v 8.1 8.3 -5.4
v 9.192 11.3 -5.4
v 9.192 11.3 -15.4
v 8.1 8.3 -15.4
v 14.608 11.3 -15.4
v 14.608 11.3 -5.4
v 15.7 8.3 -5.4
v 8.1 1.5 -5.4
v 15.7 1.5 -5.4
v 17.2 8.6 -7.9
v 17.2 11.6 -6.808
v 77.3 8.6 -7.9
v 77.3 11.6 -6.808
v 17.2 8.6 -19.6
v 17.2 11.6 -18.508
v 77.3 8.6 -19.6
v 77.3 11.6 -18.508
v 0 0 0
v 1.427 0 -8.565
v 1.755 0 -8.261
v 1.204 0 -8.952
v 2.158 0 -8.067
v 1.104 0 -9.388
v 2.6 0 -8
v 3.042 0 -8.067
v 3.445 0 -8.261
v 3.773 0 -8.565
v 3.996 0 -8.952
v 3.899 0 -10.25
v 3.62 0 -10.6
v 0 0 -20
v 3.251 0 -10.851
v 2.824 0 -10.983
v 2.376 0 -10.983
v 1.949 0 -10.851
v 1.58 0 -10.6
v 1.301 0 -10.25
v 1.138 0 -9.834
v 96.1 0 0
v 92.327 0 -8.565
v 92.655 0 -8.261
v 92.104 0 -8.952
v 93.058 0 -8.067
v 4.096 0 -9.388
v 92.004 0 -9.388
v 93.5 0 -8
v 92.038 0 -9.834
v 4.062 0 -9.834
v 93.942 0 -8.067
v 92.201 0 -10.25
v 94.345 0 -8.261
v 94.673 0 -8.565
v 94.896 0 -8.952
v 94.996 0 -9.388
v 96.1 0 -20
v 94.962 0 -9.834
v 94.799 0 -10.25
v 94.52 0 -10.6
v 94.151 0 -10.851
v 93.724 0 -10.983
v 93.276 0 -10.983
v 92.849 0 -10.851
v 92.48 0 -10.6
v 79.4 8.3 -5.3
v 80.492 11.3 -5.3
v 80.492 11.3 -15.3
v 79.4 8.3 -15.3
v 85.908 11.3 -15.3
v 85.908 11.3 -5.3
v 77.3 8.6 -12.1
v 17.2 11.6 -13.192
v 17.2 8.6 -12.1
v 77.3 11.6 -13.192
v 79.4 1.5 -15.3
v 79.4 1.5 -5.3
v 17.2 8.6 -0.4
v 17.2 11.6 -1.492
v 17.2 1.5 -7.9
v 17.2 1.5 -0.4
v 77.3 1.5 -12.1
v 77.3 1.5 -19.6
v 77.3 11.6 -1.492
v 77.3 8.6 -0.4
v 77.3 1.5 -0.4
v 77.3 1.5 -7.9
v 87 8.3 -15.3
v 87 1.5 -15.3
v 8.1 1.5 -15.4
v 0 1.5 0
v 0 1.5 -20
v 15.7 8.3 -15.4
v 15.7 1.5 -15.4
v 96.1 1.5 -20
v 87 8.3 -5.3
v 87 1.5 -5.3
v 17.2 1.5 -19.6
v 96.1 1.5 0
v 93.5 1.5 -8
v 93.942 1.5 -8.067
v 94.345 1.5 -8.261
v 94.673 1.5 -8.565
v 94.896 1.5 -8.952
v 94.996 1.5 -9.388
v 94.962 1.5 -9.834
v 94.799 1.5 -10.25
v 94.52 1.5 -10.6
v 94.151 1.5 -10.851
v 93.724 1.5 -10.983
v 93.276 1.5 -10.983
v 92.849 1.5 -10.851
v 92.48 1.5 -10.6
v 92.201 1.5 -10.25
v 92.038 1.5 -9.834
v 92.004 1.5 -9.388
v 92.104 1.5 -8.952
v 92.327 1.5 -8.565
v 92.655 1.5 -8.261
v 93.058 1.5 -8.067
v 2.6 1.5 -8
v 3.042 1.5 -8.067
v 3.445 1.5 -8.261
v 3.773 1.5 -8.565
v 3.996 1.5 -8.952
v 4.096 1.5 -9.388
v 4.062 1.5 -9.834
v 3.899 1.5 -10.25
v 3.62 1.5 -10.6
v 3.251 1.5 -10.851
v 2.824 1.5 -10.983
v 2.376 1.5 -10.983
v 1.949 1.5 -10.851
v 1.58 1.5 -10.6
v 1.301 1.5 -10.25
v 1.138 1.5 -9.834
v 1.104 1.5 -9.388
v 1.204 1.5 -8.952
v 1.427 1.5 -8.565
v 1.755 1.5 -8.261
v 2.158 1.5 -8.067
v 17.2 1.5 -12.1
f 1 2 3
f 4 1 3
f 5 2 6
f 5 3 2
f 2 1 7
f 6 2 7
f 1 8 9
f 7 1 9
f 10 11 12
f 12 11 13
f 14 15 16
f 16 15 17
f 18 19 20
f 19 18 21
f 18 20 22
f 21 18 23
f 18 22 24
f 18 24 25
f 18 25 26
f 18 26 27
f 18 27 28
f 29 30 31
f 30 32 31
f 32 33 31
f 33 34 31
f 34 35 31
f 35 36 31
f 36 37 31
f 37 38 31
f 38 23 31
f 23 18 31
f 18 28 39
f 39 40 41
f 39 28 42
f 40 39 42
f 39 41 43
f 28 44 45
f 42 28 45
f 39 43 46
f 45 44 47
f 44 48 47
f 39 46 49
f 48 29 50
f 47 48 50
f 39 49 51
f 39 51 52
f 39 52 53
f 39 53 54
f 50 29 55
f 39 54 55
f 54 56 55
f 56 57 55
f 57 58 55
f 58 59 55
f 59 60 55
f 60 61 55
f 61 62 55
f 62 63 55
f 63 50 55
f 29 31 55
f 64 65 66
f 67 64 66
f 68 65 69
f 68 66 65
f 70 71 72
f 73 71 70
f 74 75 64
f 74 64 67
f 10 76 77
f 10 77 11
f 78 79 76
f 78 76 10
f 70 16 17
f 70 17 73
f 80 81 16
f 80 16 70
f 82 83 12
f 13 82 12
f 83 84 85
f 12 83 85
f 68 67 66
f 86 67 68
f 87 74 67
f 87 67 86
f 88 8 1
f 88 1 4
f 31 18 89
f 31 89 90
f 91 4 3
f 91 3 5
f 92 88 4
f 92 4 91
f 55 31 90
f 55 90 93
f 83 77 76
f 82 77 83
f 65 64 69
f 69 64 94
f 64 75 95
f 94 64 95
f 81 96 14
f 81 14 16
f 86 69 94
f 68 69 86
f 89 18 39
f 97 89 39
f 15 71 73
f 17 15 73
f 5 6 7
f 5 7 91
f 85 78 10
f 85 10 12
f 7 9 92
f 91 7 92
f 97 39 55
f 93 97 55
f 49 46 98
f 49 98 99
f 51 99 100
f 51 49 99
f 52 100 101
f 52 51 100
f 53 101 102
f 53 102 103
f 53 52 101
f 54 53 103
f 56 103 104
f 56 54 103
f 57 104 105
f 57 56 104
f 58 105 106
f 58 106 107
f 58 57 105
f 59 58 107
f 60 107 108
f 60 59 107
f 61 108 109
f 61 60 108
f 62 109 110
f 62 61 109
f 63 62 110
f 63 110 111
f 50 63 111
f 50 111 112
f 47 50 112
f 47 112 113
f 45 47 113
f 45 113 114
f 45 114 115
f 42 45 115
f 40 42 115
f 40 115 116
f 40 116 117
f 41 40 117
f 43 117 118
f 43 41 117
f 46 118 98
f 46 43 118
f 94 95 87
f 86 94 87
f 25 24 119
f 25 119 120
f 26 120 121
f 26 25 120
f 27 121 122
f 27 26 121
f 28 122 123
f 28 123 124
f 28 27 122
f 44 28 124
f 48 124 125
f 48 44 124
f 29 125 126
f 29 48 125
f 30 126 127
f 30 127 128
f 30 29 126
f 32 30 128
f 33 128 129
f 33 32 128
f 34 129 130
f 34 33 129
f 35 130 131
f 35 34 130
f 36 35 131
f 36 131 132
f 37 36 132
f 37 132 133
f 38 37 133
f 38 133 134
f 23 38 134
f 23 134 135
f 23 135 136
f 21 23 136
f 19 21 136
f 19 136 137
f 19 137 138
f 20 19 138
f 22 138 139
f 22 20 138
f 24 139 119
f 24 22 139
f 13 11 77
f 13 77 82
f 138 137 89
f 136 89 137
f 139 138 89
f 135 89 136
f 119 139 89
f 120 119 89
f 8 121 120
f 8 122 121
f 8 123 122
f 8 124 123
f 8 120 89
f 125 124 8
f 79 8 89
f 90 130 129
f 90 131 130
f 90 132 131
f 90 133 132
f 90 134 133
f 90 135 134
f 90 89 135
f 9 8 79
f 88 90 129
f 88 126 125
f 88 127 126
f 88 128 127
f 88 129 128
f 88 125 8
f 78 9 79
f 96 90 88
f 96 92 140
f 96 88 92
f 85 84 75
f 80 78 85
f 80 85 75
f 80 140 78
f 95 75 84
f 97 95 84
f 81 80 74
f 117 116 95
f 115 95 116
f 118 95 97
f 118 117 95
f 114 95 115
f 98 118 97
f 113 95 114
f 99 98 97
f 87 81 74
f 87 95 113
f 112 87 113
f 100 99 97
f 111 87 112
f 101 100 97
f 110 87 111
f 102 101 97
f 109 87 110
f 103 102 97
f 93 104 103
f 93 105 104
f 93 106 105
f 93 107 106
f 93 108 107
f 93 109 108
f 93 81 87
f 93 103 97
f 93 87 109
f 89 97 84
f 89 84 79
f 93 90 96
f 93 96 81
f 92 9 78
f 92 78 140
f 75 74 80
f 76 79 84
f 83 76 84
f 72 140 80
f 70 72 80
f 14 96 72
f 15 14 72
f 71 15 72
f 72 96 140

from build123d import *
from OCP.BRepFilletAPI import BRepFilletAPI_MakeChamfer

# Parameters (mm, degrees)
SKETCH1_W                 = 96.1
SKETCH1_H                 = 20
SKETCH1_R                 = 1.5
BOSS_EXTRUDE1_DEPTH       = 1.5
SKETCH2_W                 = 60.1
SKETCH2_H                 = 7.5
BOSS_EXTRUDE2_DEPTH       = 10.1
CHAMFER1_SIZE             = 3
CHAMFER1_SIZE2            = 1.091910703
CHAMFER1_OF_MIRROR1_SIZE  = 3
CHAMFER1_OF_MIRROR1_SIZE2 = 1.091910703
SKETCH3_W                 = 7.6
SKETCH3_H                 = 10
BOSS_EXTRUDE3_DEPTH       = 9.8
CHAMFER2_SIZE             = 3
CHAMFER2_SIZE2            = 1.091910703


with BuildPart() as part:
    # Sketch1 → Boss-Extrude1 (new body)
    with BuildSketch(Plane(origin=(0, 0, 0), x_dir=(1, 0, 0), z_dir=(0, 1, 0))):
        with Locations((48.05, 10)):
            Rectangle(SKETCH1_W, SKETCH1_H)
        with Locations(Location((2.6, 9.5, 0), (0, 0, 270))):
            Circle(SKETCH1_R, mode=Mode.SUBTRACT)
        with Locations(Location((93.5, 9.5, 0), (0, 0, 270))):
            Circle(SKETCH1_R, mode=Mode.SUBTRACT)
    extrude(amount=BOSS_EXTRUDE1_DEPTH)

    # Sketch2 → Boss-Extrude2 (add)
    with BuildSketch(Plane(origin=(0, 1.5, 0), x_dir=(1, 0, 0), z_dir=(0, 1, 0))):
        with Locations((47.25, 4.15)):
            Rectangle(SKETCH2_W, SKETCH2_H)
    boss_extrude2 = extrude(amount=BOSS_EXTRUDE2_DEPTH)

    # Chamfer1: one chamfer whose edges measure the first distance from different faces: ONE call of the kernel's chamfer builder (chamfer() names one face for all edges)
    chamfer1_edges_1 = [part.edges().sort_by_distance(p)[0] for p in [
        (47.25, 11.6, -0.4),
    ]]
    chamfer1_side_1 = [part.faces().sort_by_distance(p)[0] for p in [
        (47.25, 6.55, -0.4),
    ]]
    chamfer1_edges_2 = [part.edges().sort_by_distance(p)[0] for p in [
        (47.25, 11.6, -7.9),
    ]]
    chamfer1_side_2 = [part.faces().sort_by_distance(p)[0] for p in [
        (47.25, 6.55, -7.9),
    ]]
    chamfer1 = BRepFilletAPI_MakeChamfer(part.part.solid().wrapped)
    for e in chamfer1_edges_1:
        chamfer1.Add(CHAMFER1_SIZE, CHAMFER1_SIZE2, e.wrapped, chamfer1_side_1[0].wrapped)  # the first distance lies on this face
    for e in chamfer1_edges_2:
        chamfer1.Add(CHAMFER1_SIZE, CHAMFER1_SIZE2, e.wrapped, chamfer1_side_2[0].wrapped)  # the first distance lies on this face
    add(Compound.cast(chamfer1.Shape()), mode=Mode.REPLACE)

    # Mirror1: Boss-Extrude2 across plane
    add(boss_extrude2.mirror(Plane.XY.offset(-10)))

    # Chamfer1 of Mirror1: one chamfer whose edges measure the first distance from different faces: ONE call of the kernel's chamfer builder (chamfer() names one face for all edges)
    chamfer1_of_mirror1_edges_1 = [part.edges().sort_by_distance(p)[0] for p in [
        (47.25, 11.6, -19.6),
    ]]
    chamfer1_of_mirror1_side_1 = [part.faces().sort_by_distance(p)[0] for p in [
        (47.25, 6.55, -19.6),
    ]]
    chamfer1_of_mirror1_edges_2 = [part.edges().sort_by_distance(p)[0] for p in [
        (47.25, 11.6, -12.1),
    ]]
    chamfer1_of_mirror1_side_2 = [part.faces().sort_by_distance(p)[0] for p in [
        (47.25, 6.55, -12.1),
    ]]
    chamfer1_of_mirror1 = BRepFilletAPI_MakeChamfer(part.part.solid().wrapped)
    for e in chamfer1_of_mirror1_edges_1:
        chamfer1_of_mirror1.Add(CHAMFER1_OF_MIRROR1_SIZE, CHAMFER1_OF_MIRROR1_SIZE2, e.wrapped, chamfer1_of_mirror1_side_1[0].wrapped)  # the first distance lies on this face
    for e in chamfer1_of_mirror1_edges_2:
        chamfer1_of_mirror1.Add(CHAMFER1_OF_MIRROR1_SIZE, CHAMFER1_OF_MIRROR1_SIZE2, e.wrapped, chamfer1_of_mirror1_side_2[0].wrapped)  # the first distance lies on this face
    add(Compound.cast(chamfer1_of_mirror1.Shape()), mode=Mode.REPLACE)

    # Sketch3 → Boss-Extrude3 (add)
    with BuildSketch(Plane(origin=(0, 1.5, 0), x_dir=(1, 0, 0), z_dir=(0, 1, 0))):
        with Locations((11.9, 10.4)):
            Rectangle(SKETCH3_W, SKETCH3_H)
        with Locations((83.2, 10.3)):
            Rectangle(SKETCH3_W, SKETCH3_H)
    extrude(amount=BOSS_EXTRUDE3_DEPTH)

    # Chamfer2: one chamfer whose edges measure the first distance from different faces: ONE call of the kernel's chamfer builder (chamfer() names one face for all edges)
    chamfer2_edges_1 = [part.edges().sort_by_distance(p)[0] for p in [
        (8.1, 11.3, -10.4),
    ]]
    chamfer2_side_1 = [part.faces().sort_by_distance(p)[0] for p in [
        (8.1, 6.4, -10.4),
    ]]
    chamfer2_edges_2 = [part.edges().sort_by_distance(p)[0] for p in [
        (15.7, 11.3, -10.4),
    ]]
    chamfer2_side_2 = [part.faces().sort_by_distance(p)[0] for p in [
        (15.7, 6.4, -10.4),
    ]]
    chamfer2_edges_3 = [part.edges().sort_by_distance(p)[0] for p in [
        (79.4, 11.3, -10.3),
    ]]
    chamfer2_side_3 = [part.faces().sort_by_distance(p)[0] for p in [
        (79.4, 6.4, -10.3),
    ]]
    chamfer2_edges_4 = [part.edges().sort_by_distance(p)[0] for p in [
        (87, 11.3, -10.3),
    ]]
    chamfer2_side_4 = [part.faces().sort_by_distance(p)[0] for p in [
        (87, 6.4, -10.3),
    ]]
    chamfer2 = BRepFilletAPI_MakeChamfer(part.part.solid().wrapped)
    for e in chamfer2_edges_1:
        chamfer2.Add(CHAMFER2_SIZE, CHAMFER2_SIZE2, e.wrapped, chamfer2_side_1[0].wrapped)  # the first distance lies on this face
    for e in chamfer2_edges_2:
        chamfer2.Add(CHAMFER2_SIZE, CHAMFER2_SIZE2, e.wrapped, chamfer2_side_2[0].wrapped)  # the first distance lies on this face
    for e in chamfer2_edges_3:
        chamfer2.Add(CHAMFER2_SIZE, CHAMFER2_SIZE2, e.wrapped, chamfer2_side_3[0].wrapped)  # the first distance lies on this face
    for e in chamfer2_edges_4:
        chamfer2.Add(CHAMFER2_SIZE, CHAMFER2_SIZE2, e.wrapped, chamfer2_side_4[0].wrapped)  # the first distance lies on this face
    add(Compound.cast(chamfer2.Shape()), mode=Mode.REPLACE)


solid = part.part
